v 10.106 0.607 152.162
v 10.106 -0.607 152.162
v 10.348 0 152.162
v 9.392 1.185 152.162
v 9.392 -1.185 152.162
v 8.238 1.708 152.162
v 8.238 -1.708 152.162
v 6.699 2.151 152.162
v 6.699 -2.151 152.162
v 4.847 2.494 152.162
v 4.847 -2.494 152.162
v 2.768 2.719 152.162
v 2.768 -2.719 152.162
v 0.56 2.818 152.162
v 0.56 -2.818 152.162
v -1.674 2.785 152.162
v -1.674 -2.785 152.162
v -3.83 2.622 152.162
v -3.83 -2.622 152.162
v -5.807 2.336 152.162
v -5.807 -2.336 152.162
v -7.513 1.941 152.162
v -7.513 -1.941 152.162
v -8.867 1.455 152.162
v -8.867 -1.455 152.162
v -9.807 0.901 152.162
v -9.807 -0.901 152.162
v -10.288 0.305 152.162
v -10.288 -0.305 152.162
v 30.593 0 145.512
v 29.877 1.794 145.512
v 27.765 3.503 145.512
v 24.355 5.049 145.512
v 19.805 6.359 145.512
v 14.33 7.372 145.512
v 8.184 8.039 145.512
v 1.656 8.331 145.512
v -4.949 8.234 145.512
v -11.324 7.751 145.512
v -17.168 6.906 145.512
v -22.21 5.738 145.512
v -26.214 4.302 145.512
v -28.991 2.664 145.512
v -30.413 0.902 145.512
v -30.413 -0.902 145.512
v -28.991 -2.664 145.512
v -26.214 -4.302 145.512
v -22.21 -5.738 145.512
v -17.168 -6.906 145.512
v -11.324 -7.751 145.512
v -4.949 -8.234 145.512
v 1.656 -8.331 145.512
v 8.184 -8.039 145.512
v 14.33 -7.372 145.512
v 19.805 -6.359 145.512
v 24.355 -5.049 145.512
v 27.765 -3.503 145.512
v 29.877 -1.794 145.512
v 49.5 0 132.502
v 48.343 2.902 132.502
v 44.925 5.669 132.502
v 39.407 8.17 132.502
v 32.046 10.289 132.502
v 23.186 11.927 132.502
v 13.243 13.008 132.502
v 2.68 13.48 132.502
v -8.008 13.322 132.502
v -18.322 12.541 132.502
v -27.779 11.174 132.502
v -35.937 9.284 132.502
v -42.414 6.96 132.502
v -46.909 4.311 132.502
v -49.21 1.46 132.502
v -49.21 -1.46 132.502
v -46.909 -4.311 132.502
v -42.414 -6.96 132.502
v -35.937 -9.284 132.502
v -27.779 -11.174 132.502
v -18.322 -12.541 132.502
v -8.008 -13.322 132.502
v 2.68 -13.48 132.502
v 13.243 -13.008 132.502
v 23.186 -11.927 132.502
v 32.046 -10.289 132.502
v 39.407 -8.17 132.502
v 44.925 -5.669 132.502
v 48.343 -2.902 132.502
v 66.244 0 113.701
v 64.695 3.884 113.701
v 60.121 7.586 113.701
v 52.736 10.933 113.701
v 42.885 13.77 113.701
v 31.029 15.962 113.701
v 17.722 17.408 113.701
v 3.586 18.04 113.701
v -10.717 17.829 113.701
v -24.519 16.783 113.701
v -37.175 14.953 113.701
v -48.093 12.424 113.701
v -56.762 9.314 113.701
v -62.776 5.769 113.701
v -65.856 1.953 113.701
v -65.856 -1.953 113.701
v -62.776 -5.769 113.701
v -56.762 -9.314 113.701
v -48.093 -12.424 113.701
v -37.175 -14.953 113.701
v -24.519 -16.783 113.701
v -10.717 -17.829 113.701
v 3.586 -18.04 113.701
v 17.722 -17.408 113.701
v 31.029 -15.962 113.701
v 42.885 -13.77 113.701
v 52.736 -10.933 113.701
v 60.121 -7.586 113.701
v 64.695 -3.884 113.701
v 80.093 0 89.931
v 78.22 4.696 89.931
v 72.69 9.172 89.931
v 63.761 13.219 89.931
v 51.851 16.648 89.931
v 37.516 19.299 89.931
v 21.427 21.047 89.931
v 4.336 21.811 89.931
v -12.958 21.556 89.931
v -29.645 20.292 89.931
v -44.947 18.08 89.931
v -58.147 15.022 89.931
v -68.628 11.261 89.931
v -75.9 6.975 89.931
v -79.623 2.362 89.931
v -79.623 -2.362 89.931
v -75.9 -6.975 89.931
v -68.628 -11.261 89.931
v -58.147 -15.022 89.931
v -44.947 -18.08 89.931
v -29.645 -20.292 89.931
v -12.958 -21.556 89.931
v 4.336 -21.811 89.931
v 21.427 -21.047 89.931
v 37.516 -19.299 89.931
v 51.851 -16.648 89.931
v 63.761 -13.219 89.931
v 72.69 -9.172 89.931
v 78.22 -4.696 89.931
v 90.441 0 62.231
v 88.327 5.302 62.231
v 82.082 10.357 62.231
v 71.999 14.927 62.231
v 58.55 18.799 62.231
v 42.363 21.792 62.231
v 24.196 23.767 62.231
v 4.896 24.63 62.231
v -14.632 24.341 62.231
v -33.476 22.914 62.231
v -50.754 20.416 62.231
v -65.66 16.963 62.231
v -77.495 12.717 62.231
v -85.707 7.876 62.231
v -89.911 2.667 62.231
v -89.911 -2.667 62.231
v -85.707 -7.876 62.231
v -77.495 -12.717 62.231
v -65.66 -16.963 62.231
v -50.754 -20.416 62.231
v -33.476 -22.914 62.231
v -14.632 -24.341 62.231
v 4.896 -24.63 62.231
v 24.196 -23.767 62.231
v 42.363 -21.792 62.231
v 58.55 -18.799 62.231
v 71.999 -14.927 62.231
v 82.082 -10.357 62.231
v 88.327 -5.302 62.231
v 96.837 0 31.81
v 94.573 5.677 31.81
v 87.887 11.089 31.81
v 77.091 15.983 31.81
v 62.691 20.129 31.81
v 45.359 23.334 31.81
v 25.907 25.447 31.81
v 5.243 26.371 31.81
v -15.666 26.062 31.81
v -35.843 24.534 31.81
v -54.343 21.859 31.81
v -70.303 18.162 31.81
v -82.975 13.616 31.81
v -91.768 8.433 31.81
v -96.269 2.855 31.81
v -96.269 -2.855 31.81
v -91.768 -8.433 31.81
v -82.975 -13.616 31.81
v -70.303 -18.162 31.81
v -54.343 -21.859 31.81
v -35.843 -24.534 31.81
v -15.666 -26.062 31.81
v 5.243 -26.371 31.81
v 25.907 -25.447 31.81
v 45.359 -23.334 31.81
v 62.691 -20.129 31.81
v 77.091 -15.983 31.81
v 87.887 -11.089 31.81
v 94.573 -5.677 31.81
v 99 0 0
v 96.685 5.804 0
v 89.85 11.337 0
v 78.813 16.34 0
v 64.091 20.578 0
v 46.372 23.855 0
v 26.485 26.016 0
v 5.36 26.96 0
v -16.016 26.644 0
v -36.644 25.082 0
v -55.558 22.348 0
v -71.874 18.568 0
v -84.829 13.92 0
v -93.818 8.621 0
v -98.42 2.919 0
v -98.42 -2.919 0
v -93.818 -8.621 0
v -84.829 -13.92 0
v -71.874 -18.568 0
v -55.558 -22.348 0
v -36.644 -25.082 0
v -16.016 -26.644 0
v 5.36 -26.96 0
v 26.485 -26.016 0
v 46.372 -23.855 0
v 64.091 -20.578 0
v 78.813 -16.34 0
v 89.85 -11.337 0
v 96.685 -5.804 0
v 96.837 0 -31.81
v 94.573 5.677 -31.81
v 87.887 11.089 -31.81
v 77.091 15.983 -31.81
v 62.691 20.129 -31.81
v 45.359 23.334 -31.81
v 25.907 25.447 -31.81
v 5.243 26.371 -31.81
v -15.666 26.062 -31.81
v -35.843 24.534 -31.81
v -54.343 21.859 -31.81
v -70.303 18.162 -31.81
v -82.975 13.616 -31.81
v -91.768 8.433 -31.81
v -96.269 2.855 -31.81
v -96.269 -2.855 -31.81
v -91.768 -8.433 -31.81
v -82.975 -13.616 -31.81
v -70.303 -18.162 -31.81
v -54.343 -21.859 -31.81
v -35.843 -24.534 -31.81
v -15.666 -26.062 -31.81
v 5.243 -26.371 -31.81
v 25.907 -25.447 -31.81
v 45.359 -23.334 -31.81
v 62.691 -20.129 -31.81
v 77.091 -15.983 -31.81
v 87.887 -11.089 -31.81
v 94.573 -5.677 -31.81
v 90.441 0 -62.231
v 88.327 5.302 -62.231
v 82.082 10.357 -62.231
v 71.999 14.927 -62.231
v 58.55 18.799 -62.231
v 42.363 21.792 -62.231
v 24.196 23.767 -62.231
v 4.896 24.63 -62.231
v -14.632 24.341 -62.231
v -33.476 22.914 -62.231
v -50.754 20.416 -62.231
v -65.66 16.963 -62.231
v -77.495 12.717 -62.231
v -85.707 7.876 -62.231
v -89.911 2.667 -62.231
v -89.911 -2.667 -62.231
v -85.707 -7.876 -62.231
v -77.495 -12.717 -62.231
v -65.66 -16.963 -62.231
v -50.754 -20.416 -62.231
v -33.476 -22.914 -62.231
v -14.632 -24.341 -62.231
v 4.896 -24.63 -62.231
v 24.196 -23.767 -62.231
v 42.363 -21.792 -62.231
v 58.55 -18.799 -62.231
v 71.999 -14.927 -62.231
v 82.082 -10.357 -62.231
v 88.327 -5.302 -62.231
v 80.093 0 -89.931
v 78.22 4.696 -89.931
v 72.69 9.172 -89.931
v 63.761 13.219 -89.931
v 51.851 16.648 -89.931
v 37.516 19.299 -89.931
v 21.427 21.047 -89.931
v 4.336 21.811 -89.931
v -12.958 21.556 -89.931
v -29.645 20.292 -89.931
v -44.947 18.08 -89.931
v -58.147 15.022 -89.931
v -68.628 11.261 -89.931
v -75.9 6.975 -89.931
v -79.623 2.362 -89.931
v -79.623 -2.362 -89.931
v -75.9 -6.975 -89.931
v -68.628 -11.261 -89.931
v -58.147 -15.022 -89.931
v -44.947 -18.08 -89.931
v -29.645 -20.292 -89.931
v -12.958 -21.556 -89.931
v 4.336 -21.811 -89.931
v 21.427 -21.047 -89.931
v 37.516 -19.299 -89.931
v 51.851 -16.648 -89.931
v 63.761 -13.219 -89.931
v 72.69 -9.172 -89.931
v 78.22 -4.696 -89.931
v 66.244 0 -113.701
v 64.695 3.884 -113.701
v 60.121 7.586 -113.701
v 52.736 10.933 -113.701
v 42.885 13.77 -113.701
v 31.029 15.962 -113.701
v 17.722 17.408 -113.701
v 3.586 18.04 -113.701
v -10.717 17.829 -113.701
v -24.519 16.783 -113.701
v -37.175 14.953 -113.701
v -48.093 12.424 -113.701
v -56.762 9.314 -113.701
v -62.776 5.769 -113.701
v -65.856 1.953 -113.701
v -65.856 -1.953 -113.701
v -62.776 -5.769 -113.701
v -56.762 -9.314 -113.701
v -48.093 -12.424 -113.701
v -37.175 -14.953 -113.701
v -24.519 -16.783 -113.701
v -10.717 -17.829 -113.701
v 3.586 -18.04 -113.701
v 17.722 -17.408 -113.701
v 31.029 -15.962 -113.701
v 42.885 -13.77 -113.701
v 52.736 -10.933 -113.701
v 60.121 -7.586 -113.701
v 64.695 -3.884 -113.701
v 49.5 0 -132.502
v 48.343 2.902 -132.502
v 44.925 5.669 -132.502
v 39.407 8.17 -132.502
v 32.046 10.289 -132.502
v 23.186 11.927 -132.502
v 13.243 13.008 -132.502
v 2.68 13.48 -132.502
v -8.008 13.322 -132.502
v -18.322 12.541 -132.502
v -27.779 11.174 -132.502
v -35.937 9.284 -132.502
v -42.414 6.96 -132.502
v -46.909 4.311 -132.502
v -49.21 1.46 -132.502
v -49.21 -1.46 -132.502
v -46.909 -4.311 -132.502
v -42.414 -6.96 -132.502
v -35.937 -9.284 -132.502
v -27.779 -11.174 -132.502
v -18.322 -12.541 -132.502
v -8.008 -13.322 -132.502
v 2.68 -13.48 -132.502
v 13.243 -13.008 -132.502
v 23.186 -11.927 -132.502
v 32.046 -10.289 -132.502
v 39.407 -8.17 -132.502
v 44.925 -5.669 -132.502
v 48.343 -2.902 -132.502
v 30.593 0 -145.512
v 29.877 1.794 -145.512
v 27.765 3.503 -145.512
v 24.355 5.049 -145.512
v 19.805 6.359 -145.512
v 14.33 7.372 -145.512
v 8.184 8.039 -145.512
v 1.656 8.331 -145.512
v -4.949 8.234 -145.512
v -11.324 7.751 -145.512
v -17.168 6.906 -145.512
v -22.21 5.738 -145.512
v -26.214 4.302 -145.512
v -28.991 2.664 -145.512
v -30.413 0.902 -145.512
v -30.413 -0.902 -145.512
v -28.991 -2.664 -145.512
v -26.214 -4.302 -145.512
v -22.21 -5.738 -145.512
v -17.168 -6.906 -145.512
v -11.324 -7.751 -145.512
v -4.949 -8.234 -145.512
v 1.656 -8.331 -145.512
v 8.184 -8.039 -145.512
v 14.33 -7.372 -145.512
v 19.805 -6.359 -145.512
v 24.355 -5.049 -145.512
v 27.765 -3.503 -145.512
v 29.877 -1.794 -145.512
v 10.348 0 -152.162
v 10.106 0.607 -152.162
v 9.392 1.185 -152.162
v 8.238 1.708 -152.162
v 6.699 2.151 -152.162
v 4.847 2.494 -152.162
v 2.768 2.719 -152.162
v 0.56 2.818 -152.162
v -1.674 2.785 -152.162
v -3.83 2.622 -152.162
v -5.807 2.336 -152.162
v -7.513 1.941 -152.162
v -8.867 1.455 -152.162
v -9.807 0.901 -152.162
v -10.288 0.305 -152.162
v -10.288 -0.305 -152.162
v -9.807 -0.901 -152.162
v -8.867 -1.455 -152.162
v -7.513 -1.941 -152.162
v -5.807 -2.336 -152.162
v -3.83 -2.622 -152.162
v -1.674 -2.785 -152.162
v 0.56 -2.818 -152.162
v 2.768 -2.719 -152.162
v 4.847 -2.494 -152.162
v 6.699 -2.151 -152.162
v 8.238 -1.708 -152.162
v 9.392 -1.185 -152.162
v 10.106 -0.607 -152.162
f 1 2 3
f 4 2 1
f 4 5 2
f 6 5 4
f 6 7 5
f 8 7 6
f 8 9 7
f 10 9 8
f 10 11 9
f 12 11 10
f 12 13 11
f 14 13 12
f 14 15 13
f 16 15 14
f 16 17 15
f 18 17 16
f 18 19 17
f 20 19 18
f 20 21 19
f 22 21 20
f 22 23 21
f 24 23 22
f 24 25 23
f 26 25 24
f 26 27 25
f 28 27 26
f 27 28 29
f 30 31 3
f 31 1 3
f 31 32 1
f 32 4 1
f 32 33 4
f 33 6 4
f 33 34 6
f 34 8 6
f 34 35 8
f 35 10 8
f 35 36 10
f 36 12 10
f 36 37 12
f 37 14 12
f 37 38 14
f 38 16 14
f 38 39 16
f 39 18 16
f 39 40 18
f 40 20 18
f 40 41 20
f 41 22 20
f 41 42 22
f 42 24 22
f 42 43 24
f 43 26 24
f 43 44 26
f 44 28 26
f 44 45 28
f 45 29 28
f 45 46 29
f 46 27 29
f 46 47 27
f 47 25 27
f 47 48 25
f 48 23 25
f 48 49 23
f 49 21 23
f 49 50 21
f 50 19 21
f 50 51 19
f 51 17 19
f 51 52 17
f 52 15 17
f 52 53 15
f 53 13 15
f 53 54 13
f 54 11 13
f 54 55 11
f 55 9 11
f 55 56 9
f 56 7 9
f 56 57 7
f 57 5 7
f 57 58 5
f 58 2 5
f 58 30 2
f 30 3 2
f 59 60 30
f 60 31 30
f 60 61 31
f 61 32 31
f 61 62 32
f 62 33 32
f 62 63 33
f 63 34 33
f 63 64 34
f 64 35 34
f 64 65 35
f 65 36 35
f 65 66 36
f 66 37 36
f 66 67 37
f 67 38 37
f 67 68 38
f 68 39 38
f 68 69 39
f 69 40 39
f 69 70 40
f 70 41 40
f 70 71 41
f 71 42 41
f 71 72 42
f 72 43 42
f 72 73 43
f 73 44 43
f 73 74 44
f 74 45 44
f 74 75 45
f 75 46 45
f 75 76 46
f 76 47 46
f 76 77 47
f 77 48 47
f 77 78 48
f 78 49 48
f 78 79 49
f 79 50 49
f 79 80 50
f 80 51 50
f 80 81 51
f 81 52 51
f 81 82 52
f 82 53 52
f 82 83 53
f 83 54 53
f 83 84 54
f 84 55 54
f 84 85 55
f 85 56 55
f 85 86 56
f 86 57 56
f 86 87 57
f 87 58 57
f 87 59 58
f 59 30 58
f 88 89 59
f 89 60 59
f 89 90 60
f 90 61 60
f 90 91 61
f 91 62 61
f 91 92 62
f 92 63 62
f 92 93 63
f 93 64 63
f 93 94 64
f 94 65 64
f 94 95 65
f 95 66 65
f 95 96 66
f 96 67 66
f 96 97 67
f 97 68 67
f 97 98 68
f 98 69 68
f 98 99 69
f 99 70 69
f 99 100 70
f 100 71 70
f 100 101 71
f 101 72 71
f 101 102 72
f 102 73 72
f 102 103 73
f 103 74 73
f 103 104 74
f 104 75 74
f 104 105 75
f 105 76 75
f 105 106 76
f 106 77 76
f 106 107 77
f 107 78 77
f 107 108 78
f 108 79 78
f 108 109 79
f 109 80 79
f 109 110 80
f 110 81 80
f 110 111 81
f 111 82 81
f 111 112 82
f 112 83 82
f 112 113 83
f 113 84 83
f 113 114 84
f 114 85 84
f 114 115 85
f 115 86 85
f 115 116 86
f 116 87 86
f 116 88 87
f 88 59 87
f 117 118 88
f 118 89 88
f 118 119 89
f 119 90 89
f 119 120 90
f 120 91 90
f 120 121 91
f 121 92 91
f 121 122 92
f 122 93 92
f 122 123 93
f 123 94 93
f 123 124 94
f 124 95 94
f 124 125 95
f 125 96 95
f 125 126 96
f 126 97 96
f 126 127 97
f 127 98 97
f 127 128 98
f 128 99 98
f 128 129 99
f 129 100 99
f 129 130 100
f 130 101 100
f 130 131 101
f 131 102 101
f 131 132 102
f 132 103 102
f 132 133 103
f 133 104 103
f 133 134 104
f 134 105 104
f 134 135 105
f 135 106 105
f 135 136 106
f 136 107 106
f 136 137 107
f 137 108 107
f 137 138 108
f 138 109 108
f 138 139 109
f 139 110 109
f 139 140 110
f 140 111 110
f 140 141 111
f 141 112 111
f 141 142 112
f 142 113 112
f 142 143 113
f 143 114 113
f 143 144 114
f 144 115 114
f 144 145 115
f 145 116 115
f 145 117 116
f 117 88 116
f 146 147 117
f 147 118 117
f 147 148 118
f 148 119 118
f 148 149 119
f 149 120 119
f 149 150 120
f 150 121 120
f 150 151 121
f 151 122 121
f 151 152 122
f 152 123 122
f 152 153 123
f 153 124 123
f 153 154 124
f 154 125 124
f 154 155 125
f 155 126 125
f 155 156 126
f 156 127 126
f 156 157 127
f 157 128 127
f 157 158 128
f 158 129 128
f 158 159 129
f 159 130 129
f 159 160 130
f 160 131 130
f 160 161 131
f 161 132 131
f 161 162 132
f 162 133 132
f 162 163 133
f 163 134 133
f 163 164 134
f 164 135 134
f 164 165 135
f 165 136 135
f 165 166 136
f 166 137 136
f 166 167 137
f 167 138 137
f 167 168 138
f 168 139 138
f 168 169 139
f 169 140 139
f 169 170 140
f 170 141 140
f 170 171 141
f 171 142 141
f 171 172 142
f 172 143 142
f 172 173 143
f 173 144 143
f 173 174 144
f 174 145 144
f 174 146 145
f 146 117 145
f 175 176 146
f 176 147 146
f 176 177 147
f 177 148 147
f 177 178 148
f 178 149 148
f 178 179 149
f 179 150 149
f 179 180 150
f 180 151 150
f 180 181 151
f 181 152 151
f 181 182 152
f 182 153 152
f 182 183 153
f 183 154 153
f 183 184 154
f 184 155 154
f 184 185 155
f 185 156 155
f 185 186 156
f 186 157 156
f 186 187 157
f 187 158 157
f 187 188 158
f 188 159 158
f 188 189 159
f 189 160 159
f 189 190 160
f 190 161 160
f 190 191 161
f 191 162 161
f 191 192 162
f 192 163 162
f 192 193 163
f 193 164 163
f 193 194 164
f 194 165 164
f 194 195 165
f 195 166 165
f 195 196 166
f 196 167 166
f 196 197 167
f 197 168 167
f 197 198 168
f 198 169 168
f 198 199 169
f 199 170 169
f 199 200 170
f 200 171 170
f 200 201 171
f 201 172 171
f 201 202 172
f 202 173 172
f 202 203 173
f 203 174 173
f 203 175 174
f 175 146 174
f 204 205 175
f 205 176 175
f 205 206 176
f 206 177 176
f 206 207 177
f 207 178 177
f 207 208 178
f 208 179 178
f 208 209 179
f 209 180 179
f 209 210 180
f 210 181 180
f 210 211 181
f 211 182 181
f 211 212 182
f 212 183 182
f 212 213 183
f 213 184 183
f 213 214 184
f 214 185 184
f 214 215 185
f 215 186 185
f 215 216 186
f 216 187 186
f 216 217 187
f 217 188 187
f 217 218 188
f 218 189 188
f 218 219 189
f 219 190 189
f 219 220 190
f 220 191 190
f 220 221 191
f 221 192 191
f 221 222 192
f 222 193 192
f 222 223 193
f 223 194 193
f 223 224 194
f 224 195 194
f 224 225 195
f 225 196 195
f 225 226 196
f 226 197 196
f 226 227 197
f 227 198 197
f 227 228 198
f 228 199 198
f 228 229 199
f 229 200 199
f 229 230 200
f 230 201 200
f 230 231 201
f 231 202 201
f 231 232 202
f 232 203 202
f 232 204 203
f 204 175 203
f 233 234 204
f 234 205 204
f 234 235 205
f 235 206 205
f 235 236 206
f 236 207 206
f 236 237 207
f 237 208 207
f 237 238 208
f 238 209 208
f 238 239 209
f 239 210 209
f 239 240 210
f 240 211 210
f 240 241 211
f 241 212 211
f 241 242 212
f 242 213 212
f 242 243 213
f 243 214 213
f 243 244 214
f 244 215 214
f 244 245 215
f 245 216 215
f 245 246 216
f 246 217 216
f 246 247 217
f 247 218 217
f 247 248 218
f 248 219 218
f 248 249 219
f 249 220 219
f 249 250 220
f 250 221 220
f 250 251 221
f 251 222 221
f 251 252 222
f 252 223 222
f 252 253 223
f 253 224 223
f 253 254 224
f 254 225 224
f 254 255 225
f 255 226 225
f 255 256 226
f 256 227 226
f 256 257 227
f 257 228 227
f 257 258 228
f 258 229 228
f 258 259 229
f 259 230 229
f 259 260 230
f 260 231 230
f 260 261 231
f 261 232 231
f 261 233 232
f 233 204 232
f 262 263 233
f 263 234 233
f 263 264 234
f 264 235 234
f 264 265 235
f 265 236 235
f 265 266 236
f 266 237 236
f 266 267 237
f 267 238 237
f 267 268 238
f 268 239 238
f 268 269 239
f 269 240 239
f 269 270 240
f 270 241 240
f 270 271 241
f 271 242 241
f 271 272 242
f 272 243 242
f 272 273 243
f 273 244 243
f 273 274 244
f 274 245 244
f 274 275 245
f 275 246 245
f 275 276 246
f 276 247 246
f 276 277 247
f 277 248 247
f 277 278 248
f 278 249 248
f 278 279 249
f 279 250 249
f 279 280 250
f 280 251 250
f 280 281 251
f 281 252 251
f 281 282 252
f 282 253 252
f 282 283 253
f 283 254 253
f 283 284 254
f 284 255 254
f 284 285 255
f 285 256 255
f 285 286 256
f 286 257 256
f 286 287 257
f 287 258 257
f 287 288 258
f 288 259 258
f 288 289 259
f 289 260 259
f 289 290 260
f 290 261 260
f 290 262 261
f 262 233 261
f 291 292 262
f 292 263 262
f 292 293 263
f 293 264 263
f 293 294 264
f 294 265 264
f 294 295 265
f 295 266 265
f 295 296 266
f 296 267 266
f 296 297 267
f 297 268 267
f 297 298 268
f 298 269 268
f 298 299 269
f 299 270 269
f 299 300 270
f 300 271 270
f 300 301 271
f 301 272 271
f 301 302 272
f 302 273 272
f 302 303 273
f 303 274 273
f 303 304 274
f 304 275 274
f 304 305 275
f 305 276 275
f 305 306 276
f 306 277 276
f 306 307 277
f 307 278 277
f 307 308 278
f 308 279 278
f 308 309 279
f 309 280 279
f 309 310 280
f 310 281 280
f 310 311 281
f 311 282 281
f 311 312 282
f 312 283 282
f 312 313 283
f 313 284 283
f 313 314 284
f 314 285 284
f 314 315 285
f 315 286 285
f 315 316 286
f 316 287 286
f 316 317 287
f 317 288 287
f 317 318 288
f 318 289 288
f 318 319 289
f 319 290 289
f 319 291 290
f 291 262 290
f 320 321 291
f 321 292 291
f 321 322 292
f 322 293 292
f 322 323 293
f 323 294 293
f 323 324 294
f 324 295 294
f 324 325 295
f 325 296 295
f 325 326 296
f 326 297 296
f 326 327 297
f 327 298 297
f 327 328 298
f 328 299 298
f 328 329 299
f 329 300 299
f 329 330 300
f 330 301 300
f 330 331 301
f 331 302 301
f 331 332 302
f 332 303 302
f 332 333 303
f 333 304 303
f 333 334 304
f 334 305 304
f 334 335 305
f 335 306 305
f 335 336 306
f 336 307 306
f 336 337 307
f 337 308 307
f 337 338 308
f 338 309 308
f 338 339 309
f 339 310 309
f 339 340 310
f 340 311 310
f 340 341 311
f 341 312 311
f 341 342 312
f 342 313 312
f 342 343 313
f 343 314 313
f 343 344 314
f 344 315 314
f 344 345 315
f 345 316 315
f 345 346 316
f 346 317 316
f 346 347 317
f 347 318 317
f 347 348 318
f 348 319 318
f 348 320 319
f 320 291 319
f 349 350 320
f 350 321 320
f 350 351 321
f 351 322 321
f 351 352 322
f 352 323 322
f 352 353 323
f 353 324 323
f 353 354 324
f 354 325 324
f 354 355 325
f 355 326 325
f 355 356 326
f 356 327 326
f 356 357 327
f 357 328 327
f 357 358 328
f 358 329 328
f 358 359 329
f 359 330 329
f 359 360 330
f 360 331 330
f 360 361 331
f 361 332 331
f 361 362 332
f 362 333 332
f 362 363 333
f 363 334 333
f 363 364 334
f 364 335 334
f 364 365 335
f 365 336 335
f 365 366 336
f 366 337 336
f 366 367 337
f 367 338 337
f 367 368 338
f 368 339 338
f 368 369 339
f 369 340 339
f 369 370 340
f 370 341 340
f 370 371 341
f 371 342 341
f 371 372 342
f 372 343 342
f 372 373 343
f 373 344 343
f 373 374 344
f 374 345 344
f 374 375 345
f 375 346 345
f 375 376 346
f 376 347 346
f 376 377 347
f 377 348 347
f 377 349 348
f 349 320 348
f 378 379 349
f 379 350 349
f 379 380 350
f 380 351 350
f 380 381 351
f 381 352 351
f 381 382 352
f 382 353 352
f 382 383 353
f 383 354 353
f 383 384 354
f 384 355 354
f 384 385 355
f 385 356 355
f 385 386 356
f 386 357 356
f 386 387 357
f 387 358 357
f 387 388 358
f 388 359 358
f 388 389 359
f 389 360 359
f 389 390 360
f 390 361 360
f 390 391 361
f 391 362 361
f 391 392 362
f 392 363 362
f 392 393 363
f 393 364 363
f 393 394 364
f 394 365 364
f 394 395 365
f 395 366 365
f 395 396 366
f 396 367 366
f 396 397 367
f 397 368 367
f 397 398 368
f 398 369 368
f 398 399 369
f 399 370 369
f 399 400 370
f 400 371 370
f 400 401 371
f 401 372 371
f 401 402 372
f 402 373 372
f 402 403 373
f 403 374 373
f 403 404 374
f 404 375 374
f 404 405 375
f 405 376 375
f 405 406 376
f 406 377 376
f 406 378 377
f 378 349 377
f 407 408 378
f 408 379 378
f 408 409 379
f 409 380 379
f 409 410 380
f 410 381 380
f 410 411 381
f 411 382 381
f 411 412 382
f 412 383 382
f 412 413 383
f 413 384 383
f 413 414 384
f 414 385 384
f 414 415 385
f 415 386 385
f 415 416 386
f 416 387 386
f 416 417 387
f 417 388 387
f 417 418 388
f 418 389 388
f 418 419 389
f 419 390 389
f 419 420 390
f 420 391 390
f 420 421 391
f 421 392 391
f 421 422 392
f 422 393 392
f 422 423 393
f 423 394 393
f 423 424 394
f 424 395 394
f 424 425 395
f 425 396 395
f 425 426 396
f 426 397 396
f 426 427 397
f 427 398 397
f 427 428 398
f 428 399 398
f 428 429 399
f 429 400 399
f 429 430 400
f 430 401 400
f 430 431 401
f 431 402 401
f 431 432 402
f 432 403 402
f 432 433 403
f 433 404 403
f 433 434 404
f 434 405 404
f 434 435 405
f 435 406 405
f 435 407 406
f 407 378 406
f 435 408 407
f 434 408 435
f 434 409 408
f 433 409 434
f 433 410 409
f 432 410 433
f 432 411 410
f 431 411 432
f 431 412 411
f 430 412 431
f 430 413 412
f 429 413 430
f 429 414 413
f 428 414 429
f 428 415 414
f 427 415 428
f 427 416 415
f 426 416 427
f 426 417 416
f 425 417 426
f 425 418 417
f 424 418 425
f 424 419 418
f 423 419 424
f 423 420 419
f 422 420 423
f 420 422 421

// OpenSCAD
// Generated by SolidPython 1.0.1 on 2020-07-29 00:46:49


scale(v = [11, 3, 17]) {
	sphere(r = 9);
}
/***********************************************
*********      SolidPython code:      **********
************************************************
 
# import packages: SolidPython
from solid import *
from solid.utils import *
from itertools import chain, combinations, permutations


class Resize:

    def __init__(self, scad_file):
        self.scad_file = scad_file
        #self.scad_file = import_scad(scad_file)
        # cone/cylinder param:
        self.r1 = 0
        self.r2 = 0
        self.h = 0
        # rectangular prism param:
        self.w = 0
        self.l = 0
        # ellipse param:
        self.r = 0

    # import OpenScad code (file name corresponds to shape)


    # classify shape + parameters
    def assign(self, param1, param2, param3):
        if self.scad_file == 'cone.scad':
            self.r1 = param1
            self.r2 = param2
            self.h = param3
        elif self.scad_file == 'cylinder.scad':
            self.r1 = param1
            self.r2 = param2
            self.h = param3
        elif self.scad_file == 'rectangularPrism.scad':
            self.h = param1
            self.l = param2
            self.w = param3
        else:
            self.r = param1
            self.h = param2

    # resize parameters
    def iterate(self):
        x = range(3, 20, 2)
        i = 1
        if self.scad_file == 'cone.scad':
            tempList = list(permutations(x, 2))
            for temp in tempList:
                param1 = temp[0]
                param2 = temp[1]
                filepath = 'produced_scad_files/' + 'cone' + str(param1) + '_' + str(param2) + '_' + '.scad'
                scad_render_to_file(cylinder(h=param1, r1=param2, r2=0), filepath)

        elif self.scad_file == 'cylinder.scad':
            tempList = list(permutations(x, 3))
            for temp in tempList:
                param1 = temp[0]
                param2 = temp[1]
                filepath = 'produced_scad_files/' + 'cylinder' + str(param1) + '_' + str(param2) + '_' + '.scad'
                scad_render_to_file(cylinder(h=param1, r1=param2, r2=param2), filepath)

        elif self.scad_file == 'rectangularPrism.scad':
            tempList = list(permutations(x, 3))
            for temp in tempList:
                param1 = temp[0]
                param2 = temp[1]
                param3 = temp[2]
                filepath = 'produced_scad_files/' + 'rectangularPrism' + str(param1) + '_' + str(param2) + '_' + str(
                    param3) + '.scad'
                scad_render_to_file(cube(size=(param1, param2, param3)), filepath)

        elif self.scad_file == 'ellipse.scad':
            tempList = list(permutations(x, 4))
            for temp in tempList:
                param1 = temp[0]
                param2 = temp[1]
                param3 = temp[2]
                param4 = temp[3]
                filepath = 'produced_scad_files/' + 'ellipse' + str(param1) + '_' + str(param2) + '_' + str(param3) + '_' + str(param4) + '.scad'
                scad_render_to_file(scale([param1, param2, param3])(sphere(r=param4)), filepath)

    def render_to_scadfile(self):
        scad_render_to_file(scad, 'example.scad') 
 
************************************************/
